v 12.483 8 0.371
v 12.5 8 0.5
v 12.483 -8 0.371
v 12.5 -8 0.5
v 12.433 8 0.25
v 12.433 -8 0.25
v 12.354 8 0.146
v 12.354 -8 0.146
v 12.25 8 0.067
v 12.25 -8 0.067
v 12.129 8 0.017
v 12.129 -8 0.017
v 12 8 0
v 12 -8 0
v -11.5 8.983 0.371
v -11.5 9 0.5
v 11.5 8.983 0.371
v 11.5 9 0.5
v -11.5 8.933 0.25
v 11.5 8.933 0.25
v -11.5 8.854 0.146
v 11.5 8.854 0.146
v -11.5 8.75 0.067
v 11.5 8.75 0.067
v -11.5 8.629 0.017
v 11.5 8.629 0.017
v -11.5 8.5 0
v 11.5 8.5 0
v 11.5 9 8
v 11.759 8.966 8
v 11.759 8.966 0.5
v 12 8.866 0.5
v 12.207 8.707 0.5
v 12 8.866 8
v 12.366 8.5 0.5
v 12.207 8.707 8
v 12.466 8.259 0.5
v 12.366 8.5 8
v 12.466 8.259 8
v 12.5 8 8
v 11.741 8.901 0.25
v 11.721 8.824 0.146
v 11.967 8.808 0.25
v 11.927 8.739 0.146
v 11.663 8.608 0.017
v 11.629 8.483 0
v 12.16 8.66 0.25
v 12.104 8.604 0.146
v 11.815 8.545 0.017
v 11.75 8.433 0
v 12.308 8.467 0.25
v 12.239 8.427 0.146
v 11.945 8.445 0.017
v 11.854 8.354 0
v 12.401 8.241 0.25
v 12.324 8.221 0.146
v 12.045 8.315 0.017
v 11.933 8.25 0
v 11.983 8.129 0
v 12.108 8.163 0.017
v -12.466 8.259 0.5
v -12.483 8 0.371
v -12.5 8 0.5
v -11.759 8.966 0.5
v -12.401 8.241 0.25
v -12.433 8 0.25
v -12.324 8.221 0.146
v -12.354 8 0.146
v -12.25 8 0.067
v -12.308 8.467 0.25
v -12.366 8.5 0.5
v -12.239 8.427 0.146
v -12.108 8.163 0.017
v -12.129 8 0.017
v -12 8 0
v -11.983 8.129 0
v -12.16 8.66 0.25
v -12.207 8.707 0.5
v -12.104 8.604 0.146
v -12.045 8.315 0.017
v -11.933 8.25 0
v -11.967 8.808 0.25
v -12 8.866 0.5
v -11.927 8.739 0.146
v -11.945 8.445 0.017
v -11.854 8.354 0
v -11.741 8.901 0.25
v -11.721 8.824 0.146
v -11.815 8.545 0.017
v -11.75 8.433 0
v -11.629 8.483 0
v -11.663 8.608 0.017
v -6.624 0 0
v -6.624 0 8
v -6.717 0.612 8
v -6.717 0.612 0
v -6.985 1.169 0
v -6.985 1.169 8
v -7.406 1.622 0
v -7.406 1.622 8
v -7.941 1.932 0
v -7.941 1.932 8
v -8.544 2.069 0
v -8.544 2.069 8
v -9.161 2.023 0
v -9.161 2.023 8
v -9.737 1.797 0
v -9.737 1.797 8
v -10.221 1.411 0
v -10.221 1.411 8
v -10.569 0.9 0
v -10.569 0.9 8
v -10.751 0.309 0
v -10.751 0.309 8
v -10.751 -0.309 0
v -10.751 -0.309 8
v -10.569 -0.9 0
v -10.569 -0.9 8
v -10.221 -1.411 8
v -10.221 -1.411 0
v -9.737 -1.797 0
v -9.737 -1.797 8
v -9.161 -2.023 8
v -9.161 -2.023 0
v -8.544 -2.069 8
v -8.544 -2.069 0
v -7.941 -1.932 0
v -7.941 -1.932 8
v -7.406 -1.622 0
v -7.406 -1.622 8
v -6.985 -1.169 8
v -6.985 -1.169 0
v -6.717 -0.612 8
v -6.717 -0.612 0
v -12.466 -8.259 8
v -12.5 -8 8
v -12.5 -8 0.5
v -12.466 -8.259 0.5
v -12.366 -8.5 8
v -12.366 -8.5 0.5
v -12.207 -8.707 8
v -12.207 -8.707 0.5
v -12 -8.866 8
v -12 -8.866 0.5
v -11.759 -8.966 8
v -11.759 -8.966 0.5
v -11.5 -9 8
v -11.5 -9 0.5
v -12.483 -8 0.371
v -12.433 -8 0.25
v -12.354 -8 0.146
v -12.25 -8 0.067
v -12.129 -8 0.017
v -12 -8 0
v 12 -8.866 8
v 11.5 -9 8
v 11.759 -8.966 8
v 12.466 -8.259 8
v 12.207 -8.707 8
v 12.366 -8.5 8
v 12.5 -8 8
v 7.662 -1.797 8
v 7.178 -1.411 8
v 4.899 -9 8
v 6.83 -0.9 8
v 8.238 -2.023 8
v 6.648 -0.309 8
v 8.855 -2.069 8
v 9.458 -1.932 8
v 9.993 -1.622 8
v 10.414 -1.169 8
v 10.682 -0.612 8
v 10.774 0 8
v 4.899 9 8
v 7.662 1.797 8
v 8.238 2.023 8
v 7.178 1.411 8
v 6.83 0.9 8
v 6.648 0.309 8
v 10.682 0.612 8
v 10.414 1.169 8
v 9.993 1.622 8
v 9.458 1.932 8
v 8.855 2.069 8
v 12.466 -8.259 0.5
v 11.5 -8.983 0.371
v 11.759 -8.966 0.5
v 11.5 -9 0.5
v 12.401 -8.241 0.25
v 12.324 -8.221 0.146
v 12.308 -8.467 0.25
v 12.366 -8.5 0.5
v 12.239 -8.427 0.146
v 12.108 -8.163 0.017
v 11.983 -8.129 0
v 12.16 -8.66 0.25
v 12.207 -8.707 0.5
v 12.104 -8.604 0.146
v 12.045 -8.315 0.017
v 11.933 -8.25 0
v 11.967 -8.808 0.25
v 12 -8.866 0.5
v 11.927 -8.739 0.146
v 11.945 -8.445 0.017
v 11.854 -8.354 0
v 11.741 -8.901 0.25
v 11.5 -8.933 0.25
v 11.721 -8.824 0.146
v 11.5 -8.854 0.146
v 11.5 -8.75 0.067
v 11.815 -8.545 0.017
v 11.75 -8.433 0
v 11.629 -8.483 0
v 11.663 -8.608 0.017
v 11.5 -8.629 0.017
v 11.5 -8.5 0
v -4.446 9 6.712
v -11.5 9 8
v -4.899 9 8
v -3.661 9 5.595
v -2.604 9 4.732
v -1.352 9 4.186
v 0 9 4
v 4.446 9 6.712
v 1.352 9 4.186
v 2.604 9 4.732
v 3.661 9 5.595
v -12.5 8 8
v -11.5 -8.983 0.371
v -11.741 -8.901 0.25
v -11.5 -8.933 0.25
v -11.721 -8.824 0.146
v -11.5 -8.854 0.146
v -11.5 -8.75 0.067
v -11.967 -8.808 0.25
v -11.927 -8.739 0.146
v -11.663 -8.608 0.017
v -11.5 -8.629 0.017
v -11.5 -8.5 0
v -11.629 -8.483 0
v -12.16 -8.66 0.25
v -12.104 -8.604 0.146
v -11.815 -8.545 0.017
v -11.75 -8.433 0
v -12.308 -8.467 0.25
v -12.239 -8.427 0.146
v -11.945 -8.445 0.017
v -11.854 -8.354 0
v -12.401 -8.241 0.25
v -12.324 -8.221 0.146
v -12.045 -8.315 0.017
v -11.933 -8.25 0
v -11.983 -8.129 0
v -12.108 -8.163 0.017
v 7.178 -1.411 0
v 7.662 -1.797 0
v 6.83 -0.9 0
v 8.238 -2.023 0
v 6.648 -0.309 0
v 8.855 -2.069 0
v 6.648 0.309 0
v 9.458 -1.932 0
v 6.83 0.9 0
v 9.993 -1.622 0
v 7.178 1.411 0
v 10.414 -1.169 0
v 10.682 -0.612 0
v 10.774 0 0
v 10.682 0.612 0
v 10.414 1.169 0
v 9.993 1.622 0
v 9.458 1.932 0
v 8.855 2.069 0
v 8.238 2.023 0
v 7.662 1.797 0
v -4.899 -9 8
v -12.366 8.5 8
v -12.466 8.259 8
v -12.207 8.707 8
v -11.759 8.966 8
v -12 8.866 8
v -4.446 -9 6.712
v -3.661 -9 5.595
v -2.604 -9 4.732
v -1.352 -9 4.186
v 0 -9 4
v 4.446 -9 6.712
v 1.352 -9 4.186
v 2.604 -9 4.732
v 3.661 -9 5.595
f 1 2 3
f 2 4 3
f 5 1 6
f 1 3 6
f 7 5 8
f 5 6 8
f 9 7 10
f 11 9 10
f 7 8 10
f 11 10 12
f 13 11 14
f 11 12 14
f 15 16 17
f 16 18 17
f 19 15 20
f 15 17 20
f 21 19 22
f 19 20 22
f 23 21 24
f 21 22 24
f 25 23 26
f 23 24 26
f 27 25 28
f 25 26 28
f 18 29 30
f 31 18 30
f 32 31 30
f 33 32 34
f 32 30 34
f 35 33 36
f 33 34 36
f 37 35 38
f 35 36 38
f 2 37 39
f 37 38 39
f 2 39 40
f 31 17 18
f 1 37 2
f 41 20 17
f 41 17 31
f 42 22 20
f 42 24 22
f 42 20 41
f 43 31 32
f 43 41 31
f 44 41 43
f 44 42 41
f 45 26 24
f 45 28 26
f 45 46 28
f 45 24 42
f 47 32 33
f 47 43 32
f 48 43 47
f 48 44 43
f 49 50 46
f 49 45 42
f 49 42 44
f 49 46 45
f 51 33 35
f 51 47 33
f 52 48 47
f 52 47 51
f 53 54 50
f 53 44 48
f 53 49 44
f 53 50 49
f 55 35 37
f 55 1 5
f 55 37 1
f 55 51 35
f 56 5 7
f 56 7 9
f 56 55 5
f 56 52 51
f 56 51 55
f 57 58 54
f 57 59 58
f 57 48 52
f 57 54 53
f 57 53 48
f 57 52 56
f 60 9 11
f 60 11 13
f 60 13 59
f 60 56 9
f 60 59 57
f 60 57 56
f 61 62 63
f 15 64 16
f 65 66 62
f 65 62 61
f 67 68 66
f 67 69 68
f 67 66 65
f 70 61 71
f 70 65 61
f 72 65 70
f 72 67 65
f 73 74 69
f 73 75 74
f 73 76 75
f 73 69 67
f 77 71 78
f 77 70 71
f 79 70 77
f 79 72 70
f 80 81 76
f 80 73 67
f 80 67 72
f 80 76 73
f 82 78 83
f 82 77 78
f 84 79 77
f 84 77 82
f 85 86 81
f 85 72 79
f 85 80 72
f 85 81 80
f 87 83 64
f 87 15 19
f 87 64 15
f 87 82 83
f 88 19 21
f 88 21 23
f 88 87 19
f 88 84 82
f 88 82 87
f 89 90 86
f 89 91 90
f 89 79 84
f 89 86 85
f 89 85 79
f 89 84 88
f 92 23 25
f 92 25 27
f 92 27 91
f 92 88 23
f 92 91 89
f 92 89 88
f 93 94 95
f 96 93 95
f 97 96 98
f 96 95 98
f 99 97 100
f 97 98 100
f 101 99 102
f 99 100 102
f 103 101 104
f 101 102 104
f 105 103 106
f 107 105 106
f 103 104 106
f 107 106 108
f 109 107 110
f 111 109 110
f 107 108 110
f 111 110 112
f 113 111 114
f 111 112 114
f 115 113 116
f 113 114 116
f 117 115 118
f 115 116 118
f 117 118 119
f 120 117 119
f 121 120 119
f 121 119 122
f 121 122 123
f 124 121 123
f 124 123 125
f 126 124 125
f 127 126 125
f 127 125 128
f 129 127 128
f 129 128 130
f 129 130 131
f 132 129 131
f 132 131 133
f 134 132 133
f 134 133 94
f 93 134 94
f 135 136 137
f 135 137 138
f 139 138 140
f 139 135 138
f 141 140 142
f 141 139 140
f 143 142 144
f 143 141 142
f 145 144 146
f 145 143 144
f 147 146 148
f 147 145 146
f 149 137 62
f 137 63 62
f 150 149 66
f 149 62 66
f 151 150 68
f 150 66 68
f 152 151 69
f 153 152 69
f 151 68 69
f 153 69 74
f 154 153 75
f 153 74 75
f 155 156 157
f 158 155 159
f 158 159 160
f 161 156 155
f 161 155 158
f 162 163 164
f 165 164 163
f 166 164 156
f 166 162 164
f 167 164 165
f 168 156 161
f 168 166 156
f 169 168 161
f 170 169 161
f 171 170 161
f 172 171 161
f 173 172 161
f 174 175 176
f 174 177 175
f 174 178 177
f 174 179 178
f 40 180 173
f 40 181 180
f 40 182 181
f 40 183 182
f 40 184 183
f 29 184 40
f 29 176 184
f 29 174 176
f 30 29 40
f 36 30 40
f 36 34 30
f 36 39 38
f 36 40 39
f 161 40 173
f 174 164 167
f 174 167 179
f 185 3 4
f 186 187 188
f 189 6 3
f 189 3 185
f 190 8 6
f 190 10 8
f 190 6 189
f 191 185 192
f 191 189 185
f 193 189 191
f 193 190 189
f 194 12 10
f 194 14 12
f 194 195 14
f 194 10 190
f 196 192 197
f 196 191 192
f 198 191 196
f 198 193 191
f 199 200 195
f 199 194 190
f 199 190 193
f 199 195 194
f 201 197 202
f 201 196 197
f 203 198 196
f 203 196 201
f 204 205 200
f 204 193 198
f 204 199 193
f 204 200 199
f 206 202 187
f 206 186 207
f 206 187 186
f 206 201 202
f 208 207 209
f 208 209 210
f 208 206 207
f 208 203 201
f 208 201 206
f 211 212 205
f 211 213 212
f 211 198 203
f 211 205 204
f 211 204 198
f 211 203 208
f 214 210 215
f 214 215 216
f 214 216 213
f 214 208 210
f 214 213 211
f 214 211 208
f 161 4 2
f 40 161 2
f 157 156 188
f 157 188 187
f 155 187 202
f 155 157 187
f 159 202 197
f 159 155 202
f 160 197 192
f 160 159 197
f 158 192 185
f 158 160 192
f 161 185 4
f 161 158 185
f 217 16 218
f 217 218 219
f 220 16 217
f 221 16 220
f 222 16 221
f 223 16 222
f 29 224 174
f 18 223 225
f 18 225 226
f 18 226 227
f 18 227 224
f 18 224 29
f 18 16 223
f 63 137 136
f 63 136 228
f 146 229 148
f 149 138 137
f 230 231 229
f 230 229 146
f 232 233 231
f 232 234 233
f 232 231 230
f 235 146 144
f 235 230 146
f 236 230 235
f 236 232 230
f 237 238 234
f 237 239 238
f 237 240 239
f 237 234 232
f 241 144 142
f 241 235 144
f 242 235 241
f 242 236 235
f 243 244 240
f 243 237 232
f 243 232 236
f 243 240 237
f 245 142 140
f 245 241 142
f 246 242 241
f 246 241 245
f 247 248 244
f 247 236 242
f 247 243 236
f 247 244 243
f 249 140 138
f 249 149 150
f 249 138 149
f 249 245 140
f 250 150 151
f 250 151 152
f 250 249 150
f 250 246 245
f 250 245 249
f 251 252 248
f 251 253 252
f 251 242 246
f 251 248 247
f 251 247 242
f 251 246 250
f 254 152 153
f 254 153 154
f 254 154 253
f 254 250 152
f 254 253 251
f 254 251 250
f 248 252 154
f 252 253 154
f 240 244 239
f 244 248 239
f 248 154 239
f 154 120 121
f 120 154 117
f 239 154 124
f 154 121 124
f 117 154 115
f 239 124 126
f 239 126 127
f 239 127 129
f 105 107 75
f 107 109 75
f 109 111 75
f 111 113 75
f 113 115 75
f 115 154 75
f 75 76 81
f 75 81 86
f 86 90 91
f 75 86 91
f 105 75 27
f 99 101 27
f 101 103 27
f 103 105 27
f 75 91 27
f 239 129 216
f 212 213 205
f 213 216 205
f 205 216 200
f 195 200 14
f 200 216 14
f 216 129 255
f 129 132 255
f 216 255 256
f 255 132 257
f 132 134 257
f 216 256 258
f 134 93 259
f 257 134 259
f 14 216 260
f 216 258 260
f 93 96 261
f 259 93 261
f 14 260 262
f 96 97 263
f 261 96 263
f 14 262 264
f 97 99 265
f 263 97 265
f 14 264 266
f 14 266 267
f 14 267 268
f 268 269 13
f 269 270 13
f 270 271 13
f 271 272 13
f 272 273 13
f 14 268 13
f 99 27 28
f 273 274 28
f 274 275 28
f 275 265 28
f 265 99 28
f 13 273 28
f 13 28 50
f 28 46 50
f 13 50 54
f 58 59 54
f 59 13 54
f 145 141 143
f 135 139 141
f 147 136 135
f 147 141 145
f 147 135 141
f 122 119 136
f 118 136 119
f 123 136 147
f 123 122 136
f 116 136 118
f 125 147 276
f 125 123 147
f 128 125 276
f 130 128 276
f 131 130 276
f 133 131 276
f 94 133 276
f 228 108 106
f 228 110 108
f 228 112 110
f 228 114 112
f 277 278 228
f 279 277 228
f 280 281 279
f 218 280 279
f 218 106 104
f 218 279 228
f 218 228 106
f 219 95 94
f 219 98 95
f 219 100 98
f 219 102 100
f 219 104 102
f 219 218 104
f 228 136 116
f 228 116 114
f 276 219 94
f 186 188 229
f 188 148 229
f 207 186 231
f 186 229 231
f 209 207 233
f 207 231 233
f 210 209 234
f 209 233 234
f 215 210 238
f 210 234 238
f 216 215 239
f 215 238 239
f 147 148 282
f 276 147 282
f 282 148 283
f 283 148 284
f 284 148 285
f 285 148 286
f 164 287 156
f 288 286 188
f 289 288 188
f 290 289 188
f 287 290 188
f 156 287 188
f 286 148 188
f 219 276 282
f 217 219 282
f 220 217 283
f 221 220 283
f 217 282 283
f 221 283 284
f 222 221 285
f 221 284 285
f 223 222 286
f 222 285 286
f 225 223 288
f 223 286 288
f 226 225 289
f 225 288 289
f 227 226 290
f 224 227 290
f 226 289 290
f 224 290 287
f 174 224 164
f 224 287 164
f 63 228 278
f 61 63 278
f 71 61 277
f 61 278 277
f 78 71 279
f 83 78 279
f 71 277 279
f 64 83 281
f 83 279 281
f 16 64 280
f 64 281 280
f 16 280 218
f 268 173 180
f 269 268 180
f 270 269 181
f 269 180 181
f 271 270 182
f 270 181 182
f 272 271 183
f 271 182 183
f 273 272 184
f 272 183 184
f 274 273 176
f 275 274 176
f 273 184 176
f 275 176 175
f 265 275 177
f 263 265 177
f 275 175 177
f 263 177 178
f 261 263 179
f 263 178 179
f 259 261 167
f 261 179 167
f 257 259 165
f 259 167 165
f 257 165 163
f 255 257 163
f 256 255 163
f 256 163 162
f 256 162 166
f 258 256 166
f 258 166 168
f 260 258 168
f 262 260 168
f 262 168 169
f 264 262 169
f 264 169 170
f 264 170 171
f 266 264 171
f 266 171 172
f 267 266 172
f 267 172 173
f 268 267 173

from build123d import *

# Parameters (mm, degrees)
F0_W     = 25
F0_H     = 18
F1_DEPTH = 8
F3_DEPTH = 25
F4_R     = 2.075
F5_R     = 2.075
F6_DEPTH = 25
F7_R     = 1
F8_R     = 0.5


with BuildPart() as f1:
    # F0 (on Top) → F1 (new body)
    with BuildSketch(Plane.XY):
        Rectangle(F0_W, F0_H)
    extrude(amount=F1_DEPTH)

    # F2 (on face) → F3 (cut)
    with BuildSketch(Plane.XZ.offset(9)):
        with BuildLine():
            Line((4.8989794856, 8), (-4.8989794856, 8))
            ThreePointArc((-4.8989794856, 8), (0, 4), (4.8989794856, 8))
        make_face()
    extrude(amount=-F3_DEPTH, mode=Mode.SUBTRACT)

    # F4 (on face) + F5 (on face) → F6 (cut)
    with BuildSketch(Plane.XY.offset(8)):
        with Locations((-8.6994897428, 0)):
            Circle(F4_R)
    with BuildSketch(Plane.XY.offset(8)):
        with Locations((8.6994897428, 0)):
            Circle(F5_R)
    extrude(amount=-F6_DEPTH, mode=Mode.SUBTRACT)

    # F7
    f7_edges = [f1.edges().sort_by_distance(p)[0] for p in [
        (-12.5, -9, 4),
        (12.5, -9, 4),
        (12.5, 9, 4),
        (-12.5, 9, 4),
    ]]
    fillet(f7_edges, radius=F7_R)

    # F8
    f8_edges = [f1.edges().sort_by_distance(p)[0] for p in [
        (-12.5, 0, 0),
    ]]
    fillet(f8_edges, radius=F8_R)


solid = f1.part
